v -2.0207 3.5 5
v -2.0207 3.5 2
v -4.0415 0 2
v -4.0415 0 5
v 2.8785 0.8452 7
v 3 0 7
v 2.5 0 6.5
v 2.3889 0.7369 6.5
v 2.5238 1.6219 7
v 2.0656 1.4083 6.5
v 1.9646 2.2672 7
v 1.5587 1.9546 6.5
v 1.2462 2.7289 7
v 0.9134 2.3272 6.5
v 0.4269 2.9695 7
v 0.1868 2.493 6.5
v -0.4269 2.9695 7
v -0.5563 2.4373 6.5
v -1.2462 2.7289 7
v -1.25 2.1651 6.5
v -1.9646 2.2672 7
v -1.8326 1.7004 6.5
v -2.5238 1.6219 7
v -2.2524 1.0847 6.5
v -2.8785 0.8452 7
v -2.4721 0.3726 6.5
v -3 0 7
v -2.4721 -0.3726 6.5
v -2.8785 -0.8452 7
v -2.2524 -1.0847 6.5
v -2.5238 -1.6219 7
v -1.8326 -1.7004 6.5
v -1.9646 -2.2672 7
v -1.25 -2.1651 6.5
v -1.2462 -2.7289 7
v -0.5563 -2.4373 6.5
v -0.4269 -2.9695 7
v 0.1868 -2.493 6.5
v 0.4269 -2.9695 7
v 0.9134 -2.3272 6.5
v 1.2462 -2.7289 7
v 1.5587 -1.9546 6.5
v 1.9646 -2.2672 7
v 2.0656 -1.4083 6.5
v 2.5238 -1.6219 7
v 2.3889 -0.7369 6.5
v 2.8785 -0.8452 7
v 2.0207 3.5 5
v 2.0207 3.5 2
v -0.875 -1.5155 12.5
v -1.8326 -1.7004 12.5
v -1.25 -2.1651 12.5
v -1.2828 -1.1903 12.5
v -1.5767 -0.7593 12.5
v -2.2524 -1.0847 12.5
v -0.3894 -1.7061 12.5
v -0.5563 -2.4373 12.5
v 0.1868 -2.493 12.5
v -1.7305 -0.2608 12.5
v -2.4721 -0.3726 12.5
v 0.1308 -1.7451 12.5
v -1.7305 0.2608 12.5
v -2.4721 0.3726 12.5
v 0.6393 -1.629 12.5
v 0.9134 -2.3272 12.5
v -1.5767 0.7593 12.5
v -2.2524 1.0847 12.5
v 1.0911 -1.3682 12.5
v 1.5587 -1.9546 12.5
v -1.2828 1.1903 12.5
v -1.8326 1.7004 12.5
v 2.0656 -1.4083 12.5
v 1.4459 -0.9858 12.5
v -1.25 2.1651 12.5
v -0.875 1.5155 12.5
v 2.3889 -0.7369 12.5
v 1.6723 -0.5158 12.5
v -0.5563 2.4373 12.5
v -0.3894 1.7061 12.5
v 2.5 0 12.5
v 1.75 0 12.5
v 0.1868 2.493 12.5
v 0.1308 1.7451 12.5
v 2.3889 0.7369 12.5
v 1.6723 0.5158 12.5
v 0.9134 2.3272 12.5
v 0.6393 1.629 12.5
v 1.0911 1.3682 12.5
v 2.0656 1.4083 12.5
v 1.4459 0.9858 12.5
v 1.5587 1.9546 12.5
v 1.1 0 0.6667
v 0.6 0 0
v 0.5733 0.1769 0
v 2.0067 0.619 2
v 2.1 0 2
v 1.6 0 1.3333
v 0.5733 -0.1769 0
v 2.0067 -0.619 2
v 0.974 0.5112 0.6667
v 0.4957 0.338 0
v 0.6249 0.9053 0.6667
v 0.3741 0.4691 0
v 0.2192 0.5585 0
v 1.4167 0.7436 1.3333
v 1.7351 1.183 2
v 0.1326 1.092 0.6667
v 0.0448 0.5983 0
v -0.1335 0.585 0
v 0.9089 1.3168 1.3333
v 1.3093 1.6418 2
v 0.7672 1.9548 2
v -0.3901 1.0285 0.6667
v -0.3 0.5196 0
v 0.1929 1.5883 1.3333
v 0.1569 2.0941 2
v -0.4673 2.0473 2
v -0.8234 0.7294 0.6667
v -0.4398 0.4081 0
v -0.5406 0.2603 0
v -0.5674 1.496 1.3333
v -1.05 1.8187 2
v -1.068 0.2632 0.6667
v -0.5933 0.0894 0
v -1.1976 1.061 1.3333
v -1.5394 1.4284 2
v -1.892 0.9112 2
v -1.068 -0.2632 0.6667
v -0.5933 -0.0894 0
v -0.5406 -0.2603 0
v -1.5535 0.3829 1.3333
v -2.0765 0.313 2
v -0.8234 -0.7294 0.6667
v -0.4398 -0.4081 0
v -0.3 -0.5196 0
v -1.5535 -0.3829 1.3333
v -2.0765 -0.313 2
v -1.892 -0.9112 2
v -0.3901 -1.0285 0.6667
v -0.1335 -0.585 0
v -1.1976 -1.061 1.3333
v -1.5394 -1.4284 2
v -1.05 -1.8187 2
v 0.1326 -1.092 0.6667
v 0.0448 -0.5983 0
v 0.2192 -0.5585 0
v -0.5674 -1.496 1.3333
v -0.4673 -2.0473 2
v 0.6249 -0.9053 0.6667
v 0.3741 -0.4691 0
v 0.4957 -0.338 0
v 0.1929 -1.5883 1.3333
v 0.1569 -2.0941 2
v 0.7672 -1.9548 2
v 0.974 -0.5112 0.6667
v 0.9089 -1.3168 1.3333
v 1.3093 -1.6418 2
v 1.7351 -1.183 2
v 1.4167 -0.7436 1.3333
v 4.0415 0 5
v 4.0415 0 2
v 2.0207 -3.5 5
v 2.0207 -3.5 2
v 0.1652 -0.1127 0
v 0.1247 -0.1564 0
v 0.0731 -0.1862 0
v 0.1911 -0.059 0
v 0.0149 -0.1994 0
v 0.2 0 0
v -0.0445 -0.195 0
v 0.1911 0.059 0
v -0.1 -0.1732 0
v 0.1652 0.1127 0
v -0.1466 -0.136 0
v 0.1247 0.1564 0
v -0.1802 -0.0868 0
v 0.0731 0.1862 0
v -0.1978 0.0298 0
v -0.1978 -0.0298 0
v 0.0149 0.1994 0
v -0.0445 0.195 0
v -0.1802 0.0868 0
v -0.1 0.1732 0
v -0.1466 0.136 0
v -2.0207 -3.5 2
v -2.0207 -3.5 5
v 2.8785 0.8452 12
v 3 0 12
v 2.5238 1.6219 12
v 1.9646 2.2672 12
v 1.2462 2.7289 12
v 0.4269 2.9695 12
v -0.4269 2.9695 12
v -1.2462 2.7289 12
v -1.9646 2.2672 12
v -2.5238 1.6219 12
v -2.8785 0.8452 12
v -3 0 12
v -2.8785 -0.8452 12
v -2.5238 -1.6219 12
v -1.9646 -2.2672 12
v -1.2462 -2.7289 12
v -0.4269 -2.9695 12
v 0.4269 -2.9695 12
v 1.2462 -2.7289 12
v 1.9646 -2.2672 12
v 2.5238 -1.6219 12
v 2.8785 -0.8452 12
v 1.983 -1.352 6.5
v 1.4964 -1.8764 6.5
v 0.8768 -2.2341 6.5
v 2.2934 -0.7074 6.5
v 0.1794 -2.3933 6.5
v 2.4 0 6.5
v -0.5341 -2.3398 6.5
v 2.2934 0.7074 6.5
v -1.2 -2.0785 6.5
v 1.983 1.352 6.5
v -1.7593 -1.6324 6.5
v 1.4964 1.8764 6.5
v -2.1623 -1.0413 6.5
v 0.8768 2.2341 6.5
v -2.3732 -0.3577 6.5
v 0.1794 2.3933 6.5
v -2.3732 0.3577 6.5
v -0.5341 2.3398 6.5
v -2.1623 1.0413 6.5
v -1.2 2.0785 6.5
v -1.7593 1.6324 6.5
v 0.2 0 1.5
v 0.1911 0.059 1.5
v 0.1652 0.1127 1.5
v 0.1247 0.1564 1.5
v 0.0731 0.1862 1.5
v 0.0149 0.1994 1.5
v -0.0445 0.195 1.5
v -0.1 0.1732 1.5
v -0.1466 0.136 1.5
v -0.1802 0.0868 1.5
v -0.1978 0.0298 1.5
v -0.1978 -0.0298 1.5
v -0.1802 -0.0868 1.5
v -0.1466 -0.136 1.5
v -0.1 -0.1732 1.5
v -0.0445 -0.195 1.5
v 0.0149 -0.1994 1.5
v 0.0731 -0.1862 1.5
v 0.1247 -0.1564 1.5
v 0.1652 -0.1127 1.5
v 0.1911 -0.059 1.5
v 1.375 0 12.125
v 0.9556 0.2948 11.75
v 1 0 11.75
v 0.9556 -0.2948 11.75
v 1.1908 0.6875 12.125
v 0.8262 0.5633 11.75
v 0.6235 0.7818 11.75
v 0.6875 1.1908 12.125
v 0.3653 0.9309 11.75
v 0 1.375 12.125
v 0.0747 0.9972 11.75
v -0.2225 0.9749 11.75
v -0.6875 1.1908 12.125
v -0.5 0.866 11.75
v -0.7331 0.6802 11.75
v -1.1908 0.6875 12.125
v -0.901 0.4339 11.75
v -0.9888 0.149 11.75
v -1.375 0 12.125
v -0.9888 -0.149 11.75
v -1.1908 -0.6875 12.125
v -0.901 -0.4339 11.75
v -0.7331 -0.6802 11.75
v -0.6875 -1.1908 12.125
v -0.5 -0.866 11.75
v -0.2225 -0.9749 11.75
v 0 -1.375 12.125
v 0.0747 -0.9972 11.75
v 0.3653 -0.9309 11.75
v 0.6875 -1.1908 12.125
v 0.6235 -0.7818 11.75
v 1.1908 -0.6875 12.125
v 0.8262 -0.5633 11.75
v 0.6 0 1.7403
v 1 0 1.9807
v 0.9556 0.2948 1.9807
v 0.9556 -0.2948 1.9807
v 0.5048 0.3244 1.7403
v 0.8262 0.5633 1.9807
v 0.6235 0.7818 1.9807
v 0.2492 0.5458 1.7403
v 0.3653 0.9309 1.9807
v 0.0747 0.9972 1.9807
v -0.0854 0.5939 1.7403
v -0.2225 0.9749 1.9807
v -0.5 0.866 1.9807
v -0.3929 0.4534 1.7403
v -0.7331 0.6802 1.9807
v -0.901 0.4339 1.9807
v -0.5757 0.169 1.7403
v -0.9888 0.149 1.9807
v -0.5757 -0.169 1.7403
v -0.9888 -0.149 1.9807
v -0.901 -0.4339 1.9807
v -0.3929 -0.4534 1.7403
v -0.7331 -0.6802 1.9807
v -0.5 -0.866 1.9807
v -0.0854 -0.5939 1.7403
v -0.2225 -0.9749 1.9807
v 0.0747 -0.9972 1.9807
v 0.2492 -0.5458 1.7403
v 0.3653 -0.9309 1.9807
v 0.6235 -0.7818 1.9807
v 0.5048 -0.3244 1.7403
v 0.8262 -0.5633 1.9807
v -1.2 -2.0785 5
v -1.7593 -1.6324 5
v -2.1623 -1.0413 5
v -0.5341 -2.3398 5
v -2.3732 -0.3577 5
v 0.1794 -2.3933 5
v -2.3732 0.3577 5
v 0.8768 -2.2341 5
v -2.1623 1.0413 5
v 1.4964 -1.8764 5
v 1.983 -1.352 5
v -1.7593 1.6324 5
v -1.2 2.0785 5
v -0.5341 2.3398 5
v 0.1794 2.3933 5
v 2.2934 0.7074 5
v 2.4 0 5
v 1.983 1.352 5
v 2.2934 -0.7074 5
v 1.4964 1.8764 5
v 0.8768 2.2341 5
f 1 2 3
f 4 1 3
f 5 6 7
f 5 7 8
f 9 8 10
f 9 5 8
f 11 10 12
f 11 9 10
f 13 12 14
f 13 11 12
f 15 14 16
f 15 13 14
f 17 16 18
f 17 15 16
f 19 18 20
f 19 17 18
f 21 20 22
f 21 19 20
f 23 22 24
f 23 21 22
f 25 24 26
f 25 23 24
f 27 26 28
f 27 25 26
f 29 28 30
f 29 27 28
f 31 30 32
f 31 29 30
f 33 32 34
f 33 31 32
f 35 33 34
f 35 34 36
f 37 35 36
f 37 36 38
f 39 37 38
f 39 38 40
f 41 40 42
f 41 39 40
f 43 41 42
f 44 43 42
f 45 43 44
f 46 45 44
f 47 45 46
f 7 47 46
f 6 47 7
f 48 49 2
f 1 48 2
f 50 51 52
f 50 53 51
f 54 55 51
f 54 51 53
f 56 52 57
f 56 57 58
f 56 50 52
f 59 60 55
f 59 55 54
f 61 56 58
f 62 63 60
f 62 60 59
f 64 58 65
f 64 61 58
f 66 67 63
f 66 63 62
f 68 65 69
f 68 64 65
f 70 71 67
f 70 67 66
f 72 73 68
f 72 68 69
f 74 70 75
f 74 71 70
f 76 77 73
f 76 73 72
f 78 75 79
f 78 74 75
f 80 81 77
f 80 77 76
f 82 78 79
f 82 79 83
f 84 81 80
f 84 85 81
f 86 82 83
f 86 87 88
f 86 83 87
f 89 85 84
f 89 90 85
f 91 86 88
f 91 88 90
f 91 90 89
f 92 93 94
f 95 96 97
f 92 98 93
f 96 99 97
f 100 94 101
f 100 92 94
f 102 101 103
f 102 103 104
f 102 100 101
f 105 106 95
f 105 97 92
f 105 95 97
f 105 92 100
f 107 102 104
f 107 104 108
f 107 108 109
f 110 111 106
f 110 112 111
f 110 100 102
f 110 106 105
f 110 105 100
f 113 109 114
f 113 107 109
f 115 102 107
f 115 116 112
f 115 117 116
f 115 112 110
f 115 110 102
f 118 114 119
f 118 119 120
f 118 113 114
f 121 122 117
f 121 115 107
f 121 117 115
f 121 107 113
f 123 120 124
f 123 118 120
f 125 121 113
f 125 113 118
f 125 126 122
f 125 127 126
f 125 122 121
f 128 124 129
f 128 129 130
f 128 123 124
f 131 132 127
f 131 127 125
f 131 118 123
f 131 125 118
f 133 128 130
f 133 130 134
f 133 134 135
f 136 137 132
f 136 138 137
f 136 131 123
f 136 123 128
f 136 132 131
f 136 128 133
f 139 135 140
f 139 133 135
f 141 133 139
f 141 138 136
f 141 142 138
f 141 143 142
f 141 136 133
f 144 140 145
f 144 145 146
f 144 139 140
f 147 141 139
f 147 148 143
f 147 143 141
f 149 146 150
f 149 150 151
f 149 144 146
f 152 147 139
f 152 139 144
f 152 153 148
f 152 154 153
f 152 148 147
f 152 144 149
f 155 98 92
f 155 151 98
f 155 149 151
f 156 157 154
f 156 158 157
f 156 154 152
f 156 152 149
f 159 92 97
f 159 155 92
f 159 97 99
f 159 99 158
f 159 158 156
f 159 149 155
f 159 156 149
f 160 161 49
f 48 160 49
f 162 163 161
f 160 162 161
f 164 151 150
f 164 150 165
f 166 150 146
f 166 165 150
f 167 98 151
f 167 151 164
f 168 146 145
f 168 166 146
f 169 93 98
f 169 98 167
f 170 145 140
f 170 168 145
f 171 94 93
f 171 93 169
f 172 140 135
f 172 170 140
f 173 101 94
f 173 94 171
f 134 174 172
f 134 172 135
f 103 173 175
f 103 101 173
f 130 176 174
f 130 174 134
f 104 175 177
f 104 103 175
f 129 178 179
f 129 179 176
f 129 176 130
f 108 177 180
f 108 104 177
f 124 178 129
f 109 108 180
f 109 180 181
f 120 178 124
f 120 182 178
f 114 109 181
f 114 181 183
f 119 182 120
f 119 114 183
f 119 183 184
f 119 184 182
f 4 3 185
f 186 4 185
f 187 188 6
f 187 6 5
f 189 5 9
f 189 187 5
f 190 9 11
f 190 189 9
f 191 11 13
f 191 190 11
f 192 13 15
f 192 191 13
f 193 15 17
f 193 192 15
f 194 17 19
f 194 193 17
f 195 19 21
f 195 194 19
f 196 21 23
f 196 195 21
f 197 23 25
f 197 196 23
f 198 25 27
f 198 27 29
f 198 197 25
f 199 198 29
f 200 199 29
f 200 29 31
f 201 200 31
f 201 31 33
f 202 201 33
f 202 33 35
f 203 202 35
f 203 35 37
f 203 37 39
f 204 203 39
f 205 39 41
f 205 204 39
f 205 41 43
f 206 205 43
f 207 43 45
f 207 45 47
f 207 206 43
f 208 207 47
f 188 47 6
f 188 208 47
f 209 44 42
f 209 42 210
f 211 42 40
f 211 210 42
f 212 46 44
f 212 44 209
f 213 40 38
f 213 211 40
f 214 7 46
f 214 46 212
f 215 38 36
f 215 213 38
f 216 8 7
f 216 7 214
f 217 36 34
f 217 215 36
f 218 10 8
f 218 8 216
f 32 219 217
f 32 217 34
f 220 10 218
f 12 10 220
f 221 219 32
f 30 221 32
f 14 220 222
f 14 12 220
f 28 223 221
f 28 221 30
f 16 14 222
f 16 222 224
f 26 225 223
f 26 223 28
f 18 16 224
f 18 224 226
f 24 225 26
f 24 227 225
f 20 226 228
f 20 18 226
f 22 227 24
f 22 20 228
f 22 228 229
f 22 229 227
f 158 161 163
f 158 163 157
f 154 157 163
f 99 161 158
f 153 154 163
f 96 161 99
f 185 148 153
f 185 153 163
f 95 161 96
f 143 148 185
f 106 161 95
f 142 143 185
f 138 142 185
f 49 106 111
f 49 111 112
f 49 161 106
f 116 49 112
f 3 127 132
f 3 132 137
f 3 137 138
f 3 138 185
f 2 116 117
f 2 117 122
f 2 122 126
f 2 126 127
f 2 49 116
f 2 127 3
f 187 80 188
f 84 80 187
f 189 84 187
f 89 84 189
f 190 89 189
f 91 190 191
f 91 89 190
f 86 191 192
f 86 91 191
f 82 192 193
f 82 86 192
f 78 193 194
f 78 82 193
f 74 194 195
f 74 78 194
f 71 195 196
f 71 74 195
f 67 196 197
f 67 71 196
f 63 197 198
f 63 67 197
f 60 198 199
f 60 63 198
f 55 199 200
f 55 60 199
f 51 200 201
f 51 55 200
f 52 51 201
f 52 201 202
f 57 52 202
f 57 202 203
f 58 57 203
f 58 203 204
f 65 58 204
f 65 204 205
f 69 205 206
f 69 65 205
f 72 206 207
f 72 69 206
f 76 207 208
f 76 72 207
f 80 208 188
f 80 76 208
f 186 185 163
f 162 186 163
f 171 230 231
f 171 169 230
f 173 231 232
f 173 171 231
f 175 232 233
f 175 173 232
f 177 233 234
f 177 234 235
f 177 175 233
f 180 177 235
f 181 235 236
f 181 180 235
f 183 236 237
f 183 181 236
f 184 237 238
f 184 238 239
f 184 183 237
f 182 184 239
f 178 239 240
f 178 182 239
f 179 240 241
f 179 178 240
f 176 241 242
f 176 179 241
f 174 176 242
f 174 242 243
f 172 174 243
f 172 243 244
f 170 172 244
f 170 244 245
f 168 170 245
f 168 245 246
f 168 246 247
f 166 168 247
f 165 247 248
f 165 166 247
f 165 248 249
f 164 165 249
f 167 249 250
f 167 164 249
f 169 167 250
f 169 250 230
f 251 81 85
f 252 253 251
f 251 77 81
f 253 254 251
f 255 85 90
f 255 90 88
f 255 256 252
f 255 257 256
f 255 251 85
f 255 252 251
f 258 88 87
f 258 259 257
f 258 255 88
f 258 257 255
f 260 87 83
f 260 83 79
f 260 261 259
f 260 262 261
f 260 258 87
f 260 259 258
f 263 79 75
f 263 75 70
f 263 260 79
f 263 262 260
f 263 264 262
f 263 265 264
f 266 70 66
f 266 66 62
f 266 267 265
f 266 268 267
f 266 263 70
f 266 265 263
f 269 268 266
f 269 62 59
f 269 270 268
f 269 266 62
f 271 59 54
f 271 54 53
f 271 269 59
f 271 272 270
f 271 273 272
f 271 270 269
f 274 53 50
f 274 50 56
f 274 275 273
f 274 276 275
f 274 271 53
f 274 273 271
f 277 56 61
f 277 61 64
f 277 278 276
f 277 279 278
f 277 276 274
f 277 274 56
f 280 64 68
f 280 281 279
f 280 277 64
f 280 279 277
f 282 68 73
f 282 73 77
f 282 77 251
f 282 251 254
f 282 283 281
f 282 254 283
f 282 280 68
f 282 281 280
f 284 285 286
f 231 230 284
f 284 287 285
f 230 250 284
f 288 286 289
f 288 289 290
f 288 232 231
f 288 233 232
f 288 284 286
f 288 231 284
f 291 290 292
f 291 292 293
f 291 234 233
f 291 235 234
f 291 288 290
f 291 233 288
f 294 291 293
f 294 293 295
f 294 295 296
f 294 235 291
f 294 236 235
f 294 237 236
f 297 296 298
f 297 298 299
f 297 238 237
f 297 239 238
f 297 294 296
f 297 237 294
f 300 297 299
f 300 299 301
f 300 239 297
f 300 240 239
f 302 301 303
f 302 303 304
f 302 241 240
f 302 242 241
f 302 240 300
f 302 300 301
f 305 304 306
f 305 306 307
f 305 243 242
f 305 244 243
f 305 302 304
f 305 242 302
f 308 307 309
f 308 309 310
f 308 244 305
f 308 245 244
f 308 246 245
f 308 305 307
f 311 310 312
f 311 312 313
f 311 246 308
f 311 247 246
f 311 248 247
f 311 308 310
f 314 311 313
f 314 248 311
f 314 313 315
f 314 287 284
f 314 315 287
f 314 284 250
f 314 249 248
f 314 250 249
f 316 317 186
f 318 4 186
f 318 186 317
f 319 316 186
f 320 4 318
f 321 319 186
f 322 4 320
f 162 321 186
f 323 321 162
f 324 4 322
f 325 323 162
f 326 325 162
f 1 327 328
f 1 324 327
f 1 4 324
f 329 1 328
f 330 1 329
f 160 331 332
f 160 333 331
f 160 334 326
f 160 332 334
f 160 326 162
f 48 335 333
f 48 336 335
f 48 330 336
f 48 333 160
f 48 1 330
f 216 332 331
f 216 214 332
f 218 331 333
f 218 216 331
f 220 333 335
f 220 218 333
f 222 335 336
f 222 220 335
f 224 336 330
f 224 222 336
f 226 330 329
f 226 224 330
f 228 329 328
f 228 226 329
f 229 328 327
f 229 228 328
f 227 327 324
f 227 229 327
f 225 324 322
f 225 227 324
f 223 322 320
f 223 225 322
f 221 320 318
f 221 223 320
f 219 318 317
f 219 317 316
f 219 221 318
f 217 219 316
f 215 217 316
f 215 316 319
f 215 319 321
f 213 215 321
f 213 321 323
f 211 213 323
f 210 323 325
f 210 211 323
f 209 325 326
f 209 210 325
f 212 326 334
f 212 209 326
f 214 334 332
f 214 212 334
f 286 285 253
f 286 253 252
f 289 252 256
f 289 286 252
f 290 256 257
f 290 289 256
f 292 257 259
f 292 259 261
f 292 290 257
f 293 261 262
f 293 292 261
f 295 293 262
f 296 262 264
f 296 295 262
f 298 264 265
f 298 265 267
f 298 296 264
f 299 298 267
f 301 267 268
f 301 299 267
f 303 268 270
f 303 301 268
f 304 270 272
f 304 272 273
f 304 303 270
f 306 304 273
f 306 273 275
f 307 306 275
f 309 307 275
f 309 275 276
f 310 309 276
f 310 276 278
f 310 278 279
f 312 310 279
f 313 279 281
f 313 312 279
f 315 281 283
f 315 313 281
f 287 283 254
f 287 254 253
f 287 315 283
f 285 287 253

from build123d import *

# Parameters (mm, degrees)
F2_SIZE  = 0.5
F3_SIZE  = 0.75
F4_R     = 5
F5_DEPTH = 10.501


with BuildPart() as f1:
    # F0 (on Front) → F1 (revolve)
    with BuildSketch(Plane.XZ):
        Polygon((0.2, 1.5), (0.2, 0), (0.6, 0), (2.1, 2), (4.2, 2), (4.2, 5), (2.4, 5), (2.4, 6.5), (3, 6.5), (3, 12.5), (1, 12.5), (1, 1.980688), align=None)
    revolve(axis=Axis((0, 0, 6.25), (0, 0, 1)))

    # F2
    f2_edges = [f1.edges().sort_by_distance(p)[0] for p in [
        (-3, 0, 6.5),
        (-3, 0, 12.5),
    ]]
    chamfer(f2_edges, length=F2_SIZE)

    # F3
    f3_edges = [f1.edges().sort_by_distance(p)[0] for p in [
        (-1, 0, 12.5),
    ]]
    chamfer(f3_edges, length=F3_SIZE)

    # F4 (on face) → F5 (cut, through all)
    with BuildSketch(Plane(origin=(0, 0, 2), x_dir=(1, 0, 0), z_dir=(0, 0, -1))):
        Circle(F4_R)
        Polygon((2.020726, -3.5), (-2.020726, -3.5), (-4.041452, 0), (-2.020726, 3.5), (2.020726, 3.5), (4.041452, 0), align=None, mode=Mode.SUBTRACT)
    extrude(amount=-F5_DEPTH, mode=Mode.SUBTRACT)


solid = f1.part
